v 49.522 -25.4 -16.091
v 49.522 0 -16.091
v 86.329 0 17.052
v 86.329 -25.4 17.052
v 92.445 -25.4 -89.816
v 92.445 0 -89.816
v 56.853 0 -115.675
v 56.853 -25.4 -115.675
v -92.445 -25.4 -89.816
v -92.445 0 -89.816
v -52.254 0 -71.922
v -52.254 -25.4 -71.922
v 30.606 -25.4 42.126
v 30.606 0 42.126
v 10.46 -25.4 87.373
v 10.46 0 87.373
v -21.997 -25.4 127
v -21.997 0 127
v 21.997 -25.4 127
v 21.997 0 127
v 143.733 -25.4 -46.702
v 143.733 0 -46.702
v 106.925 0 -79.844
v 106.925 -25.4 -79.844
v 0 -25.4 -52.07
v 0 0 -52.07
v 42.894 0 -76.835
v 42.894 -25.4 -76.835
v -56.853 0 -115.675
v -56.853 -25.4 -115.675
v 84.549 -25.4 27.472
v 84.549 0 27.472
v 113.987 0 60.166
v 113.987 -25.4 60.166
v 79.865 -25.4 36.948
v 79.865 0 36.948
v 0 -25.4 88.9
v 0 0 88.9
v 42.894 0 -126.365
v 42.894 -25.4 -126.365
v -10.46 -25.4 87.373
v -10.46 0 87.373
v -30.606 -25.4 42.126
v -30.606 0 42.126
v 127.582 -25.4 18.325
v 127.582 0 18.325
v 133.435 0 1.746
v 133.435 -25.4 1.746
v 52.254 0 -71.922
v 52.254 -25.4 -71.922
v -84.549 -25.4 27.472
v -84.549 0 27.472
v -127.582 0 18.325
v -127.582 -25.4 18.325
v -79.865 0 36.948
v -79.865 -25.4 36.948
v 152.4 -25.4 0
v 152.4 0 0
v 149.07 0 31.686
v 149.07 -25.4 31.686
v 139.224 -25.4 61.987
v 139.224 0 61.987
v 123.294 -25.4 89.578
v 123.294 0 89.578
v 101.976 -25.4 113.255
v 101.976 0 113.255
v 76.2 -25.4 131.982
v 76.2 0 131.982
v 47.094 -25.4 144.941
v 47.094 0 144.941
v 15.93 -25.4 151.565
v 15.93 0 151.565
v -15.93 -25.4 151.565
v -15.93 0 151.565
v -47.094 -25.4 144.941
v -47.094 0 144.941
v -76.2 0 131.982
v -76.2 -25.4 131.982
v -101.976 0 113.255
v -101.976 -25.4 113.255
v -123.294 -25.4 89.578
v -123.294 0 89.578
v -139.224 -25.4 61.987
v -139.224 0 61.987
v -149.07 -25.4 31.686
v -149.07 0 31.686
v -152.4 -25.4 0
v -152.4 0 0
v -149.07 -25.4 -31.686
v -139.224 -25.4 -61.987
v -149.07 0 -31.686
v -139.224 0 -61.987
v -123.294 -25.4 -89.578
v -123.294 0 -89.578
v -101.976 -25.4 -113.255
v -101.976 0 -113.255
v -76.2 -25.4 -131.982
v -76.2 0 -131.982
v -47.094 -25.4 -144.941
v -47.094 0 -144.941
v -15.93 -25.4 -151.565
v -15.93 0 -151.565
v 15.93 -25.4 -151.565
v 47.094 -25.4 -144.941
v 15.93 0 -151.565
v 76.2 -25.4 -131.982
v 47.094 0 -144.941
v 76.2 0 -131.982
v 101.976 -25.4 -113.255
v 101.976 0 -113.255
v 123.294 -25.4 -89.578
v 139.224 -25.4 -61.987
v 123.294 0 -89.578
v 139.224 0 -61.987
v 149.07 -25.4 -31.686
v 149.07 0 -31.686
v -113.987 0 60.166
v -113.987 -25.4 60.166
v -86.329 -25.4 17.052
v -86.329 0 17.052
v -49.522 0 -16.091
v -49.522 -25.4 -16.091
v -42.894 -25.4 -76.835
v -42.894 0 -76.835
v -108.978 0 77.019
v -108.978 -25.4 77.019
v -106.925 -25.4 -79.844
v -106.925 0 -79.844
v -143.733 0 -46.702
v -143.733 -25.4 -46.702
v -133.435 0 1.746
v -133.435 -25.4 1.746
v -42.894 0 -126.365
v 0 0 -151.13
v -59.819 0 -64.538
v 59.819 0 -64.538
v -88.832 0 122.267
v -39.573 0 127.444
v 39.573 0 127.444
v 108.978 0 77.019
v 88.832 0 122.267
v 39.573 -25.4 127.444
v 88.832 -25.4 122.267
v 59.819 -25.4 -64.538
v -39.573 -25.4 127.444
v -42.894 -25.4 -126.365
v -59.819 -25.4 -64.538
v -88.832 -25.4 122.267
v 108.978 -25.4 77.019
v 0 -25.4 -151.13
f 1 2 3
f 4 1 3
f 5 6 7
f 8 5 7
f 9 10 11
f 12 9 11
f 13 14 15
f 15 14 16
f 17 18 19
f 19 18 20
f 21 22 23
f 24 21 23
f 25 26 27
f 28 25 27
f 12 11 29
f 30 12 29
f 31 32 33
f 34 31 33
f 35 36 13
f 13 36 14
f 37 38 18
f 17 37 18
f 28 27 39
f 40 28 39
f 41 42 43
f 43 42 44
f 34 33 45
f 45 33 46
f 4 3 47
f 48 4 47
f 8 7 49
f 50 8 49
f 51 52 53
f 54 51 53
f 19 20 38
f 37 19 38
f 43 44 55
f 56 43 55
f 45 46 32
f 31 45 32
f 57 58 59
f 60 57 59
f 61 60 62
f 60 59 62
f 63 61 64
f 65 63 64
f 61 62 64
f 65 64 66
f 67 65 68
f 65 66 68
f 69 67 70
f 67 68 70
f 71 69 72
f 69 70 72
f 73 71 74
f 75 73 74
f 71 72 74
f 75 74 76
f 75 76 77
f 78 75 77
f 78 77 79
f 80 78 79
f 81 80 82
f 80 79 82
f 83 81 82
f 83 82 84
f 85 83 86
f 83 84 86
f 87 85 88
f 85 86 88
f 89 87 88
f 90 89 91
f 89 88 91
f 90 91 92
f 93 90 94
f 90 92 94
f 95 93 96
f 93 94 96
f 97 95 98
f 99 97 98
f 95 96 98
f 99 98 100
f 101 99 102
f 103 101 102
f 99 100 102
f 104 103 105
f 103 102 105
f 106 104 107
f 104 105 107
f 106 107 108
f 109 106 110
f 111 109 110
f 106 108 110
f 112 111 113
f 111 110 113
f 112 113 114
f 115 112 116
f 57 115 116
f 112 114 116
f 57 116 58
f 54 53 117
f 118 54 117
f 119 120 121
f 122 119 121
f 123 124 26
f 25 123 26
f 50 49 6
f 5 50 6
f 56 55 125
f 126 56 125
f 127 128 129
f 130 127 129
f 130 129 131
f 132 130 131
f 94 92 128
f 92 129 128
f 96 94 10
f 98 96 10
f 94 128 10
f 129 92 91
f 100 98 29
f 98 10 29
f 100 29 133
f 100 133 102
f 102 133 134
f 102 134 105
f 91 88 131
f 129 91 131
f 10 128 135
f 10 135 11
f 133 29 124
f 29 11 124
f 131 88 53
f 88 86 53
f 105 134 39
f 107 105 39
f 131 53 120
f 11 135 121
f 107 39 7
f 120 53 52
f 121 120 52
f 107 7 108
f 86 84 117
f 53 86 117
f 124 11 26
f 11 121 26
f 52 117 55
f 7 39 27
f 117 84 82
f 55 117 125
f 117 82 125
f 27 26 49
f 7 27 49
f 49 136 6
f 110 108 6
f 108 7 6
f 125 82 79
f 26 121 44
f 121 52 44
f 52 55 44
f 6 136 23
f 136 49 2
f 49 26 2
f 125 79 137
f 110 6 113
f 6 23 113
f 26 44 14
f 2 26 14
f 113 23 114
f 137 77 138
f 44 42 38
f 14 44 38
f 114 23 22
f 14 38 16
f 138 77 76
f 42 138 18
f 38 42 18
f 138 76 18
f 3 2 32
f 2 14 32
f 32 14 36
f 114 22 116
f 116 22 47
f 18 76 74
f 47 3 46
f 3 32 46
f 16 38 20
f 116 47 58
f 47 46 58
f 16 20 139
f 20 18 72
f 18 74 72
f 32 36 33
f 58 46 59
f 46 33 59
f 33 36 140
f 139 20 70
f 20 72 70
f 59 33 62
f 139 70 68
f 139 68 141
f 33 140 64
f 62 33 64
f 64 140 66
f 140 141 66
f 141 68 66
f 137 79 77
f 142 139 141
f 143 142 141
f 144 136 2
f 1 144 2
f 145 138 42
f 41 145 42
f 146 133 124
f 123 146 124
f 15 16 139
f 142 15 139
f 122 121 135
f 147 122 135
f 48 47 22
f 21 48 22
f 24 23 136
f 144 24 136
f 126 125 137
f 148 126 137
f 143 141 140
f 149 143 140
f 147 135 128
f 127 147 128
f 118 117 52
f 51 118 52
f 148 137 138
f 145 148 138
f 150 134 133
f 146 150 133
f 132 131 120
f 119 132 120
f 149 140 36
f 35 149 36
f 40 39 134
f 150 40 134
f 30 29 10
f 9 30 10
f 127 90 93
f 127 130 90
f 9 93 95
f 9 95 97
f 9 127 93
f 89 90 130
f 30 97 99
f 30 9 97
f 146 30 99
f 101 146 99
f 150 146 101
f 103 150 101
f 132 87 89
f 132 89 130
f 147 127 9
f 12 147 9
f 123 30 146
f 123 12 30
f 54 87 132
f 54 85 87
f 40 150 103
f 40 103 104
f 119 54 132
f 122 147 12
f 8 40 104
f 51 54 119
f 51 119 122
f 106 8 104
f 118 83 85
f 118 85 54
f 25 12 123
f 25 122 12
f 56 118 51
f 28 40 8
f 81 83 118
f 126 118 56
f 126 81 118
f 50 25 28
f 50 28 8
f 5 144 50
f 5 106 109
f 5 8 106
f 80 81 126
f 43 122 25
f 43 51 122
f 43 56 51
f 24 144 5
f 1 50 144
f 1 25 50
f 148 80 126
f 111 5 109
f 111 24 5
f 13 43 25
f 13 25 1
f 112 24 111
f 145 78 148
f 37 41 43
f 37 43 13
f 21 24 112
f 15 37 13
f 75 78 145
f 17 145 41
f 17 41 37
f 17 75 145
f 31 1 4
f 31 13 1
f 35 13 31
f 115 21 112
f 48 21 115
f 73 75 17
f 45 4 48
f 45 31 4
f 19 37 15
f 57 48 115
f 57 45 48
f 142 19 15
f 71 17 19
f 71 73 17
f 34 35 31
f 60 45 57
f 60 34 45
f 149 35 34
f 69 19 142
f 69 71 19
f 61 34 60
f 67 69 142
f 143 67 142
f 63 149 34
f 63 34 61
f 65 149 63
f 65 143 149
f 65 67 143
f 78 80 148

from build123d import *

# Parameters (mm, degrees)
F0_R     = 152.4
F2_DEPTH = 25.4


# Not quite as in the source:
# - a feature of the source that left no trace in its solid (it failed there, or was rolled back) is left out


with BuildPart() as f2:
    # F0 (on Front) → F2 (new body)
    with BuildSketch(Plane.XZ):
        Circle(F0_R)
        Polygon((-52.2541089288, -71.9216107999), (-56.8527436029, -115.6746970812), (-92.4447104794, -89.8156194901), align=None, mode=Mode.SUBTRACT)
        Polygon((-59.8193788497, -64.5381655614), (-106.9252081018, -79.8437772928), (-143.7331713077, -46.7017383599), (-133.4353052615, 1.7459123045), (-86.3294760094, 17.0515240359), (-49.5215128035, -16.0905148971), align=None, mode=Mode.SUBTRACT)
        Polygon((42.8942382494, -76.835), (42.8942382494, -126.365), (0, -151.13), (-42.8942382494, -126.365), (-42.8942382494, -76.835), (0, -52.07), align=None, mode=Mode.SUBTRACT)
        Polygon((52.2541089288, -71.9216107999), (92.4447104794, -89.8156194901), (56.8527436029, -115.6746970812), align=None, mode=Mode.SUBTRACT)
        Polygon((86.3294760094, 17.0515240359), (133.4353052615, 1.7459123045), (143.7331713077, -46.7017383599), (106.9252081018, -79.8437772928), (59.8193788497, -64.5381655614), (49.5215128035, -16.0905148971), align=None, mode=Mode.SUBTRACT)
        Polygon((-84.5489242986, 27.4716107999), (-127.5816383797, 18.3247250555), (-113.9867167593, 60.1655915157), align=None, mode=Mode.SUBTRACT)
        Polygon((-79.8646475645, 36.9482201115), (-108.9776511105, 77.0188318428), (-88.831985179, 122.2667383599), (-39.5733157014, 127.4440331455), (-10.4603121553, 87.3734214141), (-30.6059780869, 42.1255148971), align=None, mode=Mode.SUBTRACT)
        Polygon((84.5489242986, 27.4716107999), (113.9867167593, 60.1655915157), (127.5816383797, 18.3247250555), align=None, mode=Mode.SUBTRACT)
        Polygon((21.9970452561, 127), (0, 88.9), (-21.9970452561, 127), align=None, mode=Mode.SUBTRACT)
        Polygon((10.4603121553, 87.3734214141), (39.5733157014, 127.4440331455), (88.831985179, 122.2667383599), (108.9776511105, 77.0188318428), (79.8646475645, 36.9482201115), (30.6059780869, 42.1255148971), align=None, mode=Mode.SUBTRACT)
    extrude(amount=F2_DEPTH)


solid = f2.part
